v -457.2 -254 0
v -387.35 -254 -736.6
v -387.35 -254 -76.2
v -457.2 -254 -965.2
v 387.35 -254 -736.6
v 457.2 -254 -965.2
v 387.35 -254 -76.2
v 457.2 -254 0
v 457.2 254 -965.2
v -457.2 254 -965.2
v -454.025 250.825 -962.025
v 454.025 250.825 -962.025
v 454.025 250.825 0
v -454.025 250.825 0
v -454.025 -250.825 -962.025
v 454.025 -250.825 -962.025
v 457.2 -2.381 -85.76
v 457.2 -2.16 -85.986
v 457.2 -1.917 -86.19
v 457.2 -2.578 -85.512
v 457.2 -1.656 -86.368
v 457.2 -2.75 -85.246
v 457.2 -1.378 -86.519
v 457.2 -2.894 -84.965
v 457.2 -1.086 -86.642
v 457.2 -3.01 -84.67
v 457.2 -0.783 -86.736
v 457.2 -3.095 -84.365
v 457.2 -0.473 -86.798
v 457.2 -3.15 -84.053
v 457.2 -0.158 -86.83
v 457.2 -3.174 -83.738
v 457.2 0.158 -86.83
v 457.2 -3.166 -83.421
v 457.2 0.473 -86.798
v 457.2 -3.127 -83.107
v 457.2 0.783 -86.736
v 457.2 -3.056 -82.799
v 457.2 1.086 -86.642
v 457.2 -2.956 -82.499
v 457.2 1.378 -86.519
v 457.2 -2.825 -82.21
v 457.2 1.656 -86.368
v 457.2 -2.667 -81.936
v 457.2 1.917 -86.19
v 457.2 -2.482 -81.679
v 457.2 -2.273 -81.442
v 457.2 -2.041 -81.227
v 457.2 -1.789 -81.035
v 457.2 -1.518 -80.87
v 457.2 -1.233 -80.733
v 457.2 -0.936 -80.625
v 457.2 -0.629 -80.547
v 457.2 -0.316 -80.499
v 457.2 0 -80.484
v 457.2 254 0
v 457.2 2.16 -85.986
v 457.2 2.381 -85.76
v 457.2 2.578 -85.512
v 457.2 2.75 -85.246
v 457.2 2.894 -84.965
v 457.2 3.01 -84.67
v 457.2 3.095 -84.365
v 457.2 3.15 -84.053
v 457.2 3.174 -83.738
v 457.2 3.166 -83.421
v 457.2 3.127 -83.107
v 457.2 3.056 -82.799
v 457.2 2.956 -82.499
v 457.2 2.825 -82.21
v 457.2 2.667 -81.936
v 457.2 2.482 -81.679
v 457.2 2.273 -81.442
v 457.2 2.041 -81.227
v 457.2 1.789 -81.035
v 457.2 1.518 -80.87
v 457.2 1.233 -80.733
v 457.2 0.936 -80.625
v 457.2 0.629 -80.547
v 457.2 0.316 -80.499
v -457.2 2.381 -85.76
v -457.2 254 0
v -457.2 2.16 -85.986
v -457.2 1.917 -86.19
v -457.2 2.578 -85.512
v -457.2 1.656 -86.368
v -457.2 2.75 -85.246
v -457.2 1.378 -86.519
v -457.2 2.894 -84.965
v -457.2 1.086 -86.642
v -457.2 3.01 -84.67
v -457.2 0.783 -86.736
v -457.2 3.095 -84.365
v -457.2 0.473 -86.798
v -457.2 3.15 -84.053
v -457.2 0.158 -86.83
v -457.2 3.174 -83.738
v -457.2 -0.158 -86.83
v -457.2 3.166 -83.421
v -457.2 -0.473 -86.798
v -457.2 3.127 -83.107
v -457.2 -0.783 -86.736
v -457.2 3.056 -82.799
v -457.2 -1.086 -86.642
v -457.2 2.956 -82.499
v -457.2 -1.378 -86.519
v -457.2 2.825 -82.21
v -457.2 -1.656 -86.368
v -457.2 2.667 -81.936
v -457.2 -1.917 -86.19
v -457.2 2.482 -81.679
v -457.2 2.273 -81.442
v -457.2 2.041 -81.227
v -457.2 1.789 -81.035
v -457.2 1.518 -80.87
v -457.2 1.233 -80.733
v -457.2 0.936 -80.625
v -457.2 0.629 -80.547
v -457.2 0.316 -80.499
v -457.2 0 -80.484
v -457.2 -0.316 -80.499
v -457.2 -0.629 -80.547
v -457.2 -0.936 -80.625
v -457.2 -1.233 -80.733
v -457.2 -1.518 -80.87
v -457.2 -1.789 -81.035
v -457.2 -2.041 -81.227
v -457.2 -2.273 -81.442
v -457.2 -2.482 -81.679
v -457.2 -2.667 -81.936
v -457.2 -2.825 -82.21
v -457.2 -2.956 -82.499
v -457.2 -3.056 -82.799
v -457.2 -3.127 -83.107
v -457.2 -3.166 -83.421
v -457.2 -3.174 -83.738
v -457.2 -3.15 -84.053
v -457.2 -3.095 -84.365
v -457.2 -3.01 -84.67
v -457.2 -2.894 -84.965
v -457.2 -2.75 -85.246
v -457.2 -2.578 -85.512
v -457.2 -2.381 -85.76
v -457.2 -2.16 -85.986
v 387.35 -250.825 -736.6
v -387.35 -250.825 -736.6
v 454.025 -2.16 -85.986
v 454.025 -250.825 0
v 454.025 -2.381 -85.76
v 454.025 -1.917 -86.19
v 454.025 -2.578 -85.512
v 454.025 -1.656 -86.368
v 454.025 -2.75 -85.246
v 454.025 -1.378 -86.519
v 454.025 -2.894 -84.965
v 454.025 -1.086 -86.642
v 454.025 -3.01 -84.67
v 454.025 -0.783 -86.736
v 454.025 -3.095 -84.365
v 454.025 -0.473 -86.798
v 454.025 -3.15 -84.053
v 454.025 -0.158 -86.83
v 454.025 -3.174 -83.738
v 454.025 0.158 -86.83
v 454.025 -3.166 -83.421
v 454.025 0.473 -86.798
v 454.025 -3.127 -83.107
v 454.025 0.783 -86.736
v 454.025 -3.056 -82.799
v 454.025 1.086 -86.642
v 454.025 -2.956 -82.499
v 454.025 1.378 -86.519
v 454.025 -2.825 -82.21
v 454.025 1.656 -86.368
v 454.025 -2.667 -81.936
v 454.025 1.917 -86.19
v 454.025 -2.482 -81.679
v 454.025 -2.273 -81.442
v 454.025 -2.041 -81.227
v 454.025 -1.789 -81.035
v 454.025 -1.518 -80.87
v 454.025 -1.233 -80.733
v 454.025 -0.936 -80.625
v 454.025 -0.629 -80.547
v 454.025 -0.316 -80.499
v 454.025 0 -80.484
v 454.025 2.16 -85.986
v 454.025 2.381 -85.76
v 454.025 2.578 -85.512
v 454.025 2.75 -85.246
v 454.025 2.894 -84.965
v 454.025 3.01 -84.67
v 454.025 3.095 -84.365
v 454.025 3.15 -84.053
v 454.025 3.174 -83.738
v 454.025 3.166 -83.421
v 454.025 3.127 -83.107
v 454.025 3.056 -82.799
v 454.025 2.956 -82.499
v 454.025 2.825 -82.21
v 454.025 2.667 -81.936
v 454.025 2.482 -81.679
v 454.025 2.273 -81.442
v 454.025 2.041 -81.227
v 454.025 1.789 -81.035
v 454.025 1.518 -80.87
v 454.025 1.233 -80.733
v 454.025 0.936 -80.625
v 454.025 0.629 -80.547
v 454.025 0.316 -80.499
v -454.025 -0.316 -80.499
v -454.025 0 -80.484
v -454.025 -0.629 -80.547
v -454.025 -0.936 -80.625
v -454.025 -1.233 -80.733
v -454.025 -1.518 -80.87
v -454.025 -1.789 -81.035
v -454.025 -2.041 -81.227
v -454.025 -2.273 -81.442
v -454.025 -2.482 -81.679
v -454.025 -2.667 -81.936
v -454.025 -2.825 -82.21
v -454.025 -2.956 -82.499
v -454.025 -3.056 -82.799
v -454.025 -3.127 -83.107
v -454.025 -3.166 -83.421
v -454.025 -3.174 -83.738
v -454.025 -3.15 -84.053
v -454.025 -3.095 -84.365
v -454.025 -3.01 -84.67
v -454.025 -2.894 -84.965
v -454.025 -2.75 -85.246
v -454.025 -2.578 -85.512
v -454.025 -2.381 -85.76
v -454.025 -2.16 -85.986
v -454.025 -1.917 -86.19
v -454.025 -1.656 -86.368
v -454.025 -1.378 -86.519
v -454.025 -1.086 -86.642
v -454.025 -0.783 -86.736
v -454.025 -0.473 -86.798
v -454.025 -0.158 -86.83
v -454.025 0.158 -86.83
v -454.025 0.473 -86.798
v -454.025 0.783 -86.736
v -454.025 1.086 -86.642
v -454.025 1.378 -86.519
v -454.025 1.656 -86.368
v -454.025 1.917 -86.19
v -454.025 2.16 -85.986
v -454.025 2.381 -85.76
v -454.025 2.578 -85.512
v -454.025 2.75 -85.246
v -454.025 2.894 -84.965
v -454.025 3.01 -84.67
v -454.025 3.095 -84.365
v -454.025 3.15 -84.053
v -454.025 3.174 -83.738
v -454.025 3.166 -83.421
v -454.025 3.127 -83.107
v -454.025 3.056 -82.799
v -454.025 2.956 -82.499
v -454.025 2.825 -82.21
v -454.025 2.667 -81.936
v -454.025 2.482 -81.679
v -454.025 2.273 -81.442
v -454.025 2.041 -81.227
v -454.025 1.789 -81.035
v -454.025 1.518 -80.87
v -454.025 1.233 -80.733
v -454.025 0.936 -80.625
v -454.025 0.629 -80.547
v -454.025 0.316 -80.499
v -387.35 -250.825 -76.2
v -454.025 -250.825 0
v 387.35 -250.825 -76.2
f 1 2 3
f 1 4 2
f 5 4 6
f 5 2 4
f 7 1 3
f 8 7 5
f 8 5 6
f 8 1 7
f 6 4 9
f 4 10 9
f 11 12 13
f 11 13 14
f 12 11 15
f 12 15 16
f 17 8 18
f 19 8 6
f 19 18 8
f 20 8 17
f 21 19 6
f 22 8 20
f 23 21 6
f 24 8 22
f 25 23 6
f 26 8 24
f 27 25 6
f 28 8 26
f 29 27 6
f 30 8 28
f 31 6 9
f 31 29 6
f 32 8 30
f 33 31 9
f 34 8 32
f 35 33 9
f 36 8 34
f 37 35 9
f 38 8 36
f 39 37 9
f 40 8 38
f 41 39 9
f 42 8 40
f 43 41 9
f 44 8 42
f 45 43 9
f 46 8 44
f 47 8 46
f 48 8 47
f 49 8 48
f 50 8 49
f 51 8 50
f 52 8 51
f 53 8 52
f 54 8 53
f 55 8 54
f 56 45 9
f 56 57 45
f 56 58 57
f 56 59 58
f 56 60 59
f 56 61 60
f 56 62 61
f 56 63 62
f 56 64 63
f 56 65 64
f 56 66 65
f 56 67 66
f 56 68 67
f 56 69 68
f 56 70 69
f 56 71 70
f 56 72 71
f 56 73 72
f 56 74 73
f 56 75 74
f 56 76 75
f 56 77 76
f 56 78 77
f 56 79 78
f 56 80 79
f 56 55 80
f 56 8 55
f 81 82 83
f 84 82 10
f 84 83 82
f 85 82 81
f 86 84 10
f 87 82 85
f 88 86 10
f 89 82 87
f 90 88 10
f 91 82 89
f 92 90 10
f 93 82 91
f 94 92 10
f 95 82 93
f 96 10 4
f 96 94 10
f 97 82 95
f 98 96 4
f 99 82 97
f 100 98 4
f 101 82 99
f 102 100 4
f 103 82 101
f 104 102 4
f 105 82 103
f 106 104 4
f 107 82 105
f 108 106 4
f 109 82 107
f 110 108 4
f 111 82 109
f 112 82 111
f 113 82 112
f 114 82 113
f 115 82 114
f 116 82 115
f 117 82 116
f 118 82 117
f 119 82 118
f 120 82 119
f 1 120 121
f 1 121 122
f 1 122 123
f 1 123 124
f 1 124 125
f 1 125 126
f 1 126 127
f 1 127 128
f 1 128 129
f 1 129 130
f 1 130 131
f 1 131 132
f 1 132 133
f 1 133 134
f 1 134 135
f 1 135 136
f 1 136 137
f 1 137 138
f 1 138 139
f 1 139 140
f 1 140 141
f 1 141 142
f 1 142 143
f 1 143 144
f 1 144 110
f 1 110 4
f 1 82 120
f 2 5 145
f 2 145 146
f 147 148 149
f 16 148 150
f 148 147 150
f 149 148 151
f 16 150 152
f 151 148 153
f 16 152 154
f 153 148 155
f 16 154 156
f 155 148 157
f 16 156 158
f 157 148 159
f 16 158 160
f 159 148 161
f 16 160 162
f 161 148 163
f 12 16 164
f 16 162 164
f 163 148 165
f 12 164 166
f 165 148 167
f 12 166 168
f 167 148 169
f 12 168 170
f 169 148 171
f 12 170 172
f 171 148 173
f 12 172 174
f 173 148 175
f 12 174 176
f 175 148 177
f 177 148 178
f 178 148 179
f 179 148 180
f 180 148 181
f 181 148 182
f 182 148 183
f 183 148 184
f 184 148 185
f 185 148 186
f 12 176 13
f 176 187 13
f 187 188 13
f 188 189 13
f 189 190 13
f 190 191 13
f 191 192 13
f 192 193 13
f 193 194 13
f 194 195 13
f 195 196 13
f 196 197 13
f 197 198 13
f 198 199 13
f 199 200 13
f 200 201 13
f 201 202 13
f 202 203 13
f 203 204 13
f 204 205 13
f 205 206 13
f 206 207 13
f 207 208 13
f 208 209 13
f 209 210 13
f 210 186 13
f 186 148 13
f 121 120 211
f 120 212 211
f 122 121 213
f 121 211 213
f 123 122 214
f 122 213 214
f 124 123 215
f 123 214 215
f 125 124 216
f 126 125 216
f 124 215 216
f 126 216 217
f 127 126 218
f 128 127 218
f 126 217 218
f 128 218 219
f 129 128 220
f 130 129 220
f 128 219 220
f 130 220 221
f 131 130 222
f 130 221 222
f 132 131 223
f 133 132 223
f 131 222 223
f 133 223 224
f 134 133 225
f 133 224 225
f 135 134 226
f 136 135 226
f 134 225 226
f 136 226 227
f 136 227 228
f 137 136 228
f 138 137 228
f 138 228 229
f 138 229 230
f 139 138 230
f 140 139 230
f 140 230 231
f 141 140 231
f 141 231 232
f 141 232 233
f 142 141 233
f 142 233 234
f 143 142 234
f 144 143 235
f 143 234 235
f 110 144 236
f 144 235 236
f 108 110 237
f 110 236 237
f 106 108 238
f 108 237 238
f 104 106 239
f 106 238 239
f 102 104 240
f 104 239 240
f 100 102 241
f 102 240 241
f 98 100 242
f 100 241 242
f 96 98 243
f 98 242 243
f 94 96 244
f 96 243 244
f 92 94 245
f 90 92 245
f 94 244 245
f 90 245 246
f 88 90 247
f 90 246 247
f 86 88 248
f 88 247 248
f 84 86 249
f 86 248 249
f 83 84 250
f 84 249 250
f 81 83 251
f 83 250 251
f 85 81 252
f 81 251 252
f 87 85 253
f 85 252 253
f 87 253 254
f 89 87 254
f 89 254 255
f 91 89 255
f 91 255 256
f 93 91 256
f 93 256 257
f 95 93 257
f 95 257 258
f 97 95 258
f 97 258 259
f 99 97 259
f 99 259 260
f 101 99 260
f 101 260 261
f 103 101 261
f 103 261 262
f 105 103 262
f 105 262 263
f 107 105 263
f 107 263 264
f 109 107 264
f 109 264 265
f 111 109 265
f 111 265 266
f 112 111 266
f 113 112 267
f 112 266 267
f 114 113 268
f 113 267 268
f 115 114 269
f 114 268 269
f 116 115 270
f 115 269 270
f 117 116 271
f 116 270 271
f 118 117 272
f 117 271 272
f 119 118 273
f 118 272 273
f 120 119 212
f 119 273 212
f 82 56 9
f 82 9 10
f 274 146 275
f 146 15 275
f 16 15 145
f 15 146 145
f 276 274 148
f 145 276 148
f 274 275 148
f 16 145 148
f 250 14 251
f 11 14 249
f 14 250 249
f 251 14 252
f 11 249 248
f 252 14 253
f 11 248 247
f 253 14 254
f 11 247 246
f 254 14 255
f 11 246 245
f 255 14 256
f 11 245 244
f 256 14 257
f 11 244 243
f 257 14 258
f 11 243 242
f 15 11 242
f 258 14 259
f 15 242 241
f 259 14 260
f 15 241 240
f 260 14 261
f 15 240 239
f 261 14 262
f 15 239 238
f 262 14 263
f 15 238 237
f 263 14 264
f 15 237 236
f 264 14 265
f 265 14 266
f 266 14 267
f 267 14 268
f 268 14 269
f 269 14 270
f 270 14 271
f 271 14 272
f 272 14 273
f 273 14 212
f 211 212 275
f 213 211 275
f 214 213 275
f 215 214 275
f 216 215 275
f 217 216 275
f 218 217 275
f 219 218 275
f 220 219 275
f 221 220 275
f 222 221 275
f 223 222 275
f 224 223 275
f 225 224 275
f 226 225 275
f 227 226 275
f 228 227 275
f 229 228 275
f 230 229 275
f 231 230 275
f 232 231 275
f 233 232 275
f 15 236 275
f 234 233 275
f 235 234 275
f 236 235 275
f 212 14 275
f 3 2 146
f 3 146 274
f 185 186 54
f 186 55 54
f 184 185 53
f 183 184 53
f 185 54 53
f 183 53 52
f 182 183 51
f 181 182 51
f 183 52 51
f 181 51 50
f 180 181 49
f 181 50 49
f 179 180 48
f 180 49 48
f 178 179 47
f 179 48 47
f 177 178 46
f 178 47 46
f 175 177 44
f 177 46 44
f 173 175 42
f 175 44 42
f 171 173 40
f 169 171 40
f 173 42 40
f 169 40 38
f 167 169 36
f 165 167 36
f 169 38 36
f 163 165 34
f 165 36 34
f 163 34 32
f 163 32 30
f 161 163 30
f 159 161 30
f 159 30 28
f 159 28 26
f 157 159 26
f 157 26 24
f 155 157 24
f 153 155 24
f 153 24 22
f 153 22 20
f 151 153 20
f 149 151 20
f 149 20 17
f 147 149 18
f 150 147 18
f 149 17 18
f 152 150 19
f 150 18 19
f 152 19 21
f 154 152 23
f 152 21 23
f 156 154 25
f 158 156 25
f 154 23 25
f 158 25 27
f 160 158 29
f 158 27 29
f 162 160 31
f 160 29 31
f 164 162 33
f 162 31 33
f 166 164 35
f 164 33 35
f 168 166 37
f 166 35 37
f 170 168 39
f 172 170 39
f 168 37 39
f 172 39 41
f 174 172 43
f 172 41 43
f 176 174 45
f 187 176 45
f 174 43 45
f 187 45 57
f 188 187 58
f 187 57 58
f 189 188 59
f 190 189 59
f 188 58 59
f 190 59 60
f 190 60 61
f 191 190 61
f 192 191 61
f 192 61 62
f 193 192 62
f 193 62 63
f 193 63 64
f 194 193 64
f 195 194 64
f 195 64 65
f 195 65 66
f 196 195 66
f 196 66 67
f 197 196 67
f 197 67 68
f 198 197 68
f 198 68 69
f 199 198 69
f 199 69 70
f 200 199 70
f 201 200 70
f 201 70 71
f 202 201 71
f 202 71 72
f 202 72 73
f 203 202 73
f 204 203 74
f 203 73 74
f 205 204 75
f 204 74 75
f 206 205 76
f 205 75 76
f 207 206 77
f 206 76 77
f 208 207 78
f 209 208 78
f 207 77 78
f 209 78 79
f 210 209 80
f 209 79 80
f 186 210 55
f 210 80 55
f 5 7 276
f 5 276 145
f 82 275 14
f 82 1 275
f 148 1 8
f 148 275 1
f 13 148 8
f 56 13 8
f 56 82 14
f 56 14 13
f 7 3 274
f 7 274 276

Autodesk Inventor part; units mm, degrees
ref_plane "YZ Plane" through (0, 0, 0) normal (1, 0, 0) x (0, 1, 0)
ref_plane "XZ Plane" through (0, 0, 0) normal (0, 1, 0) x (-1, 0, 0)
ref_plane "XY Plane" through (0, 0, 0) normal (0, 0, 1) x (1, 0, 0)
sketch "Sketch1" plane through (0, 0, 0) normal (0, 0, 1) x (1, 0, 0)
  line L0 (-457.2, -254) -> (457.2, -254)
  line L1 (457.2, -254) -> (457.2, 254)
  line L2 (457.2, 254) -> (-457.2, 254)
  line L3 (-457.2, 254) -> (-457.2, -254)
  line L4 (-457.2, -254) -> (457.2, 254) construction
  line L5 (457.2, -254) -> (-457.2, 254) construction
  point P0 (0, 0)
  dimension "d0" = 914.4
  dimension "d1" = 508
extrude "Extrusion1" add sketch "Sketch1" against normal blind 965.2
shell "Shell1" thickness 3.175 removed faces 1 at (-152.4, 84.6667, 0)
sketch "Sketch2" plane through (-457.2, -254, 0) normal (0, -1, 0) x (1, 0, 0)
  line L0 (0, 0) -> (0, -965.2) projected
  line L1 (914.4, -965.2) -> (0, -965.2) projected
  line L2 (69.85, -76.2) -> (844.55, -76.2)
  line L3 (844.55, -76.2) -> (844.55, -736.6)
  line L4 (844.55, -736.6) -> (69.85, -736.6)
  line L5 (69.85, -736.6) -> (69.85, -76.2)
  point P0 (457.2, 0)
  dimension "d5" = 69.85
  dimension "d6" = 774.7
  dimension "d7" = 660.4
  dimension "d8" = 228.6
extrude "Extrusion2" cut sketch "Sketch2" against normal up to next
sketch "Sketch3" plane through (-457.2, -254, 0) normal (-1, 0, 0) x (0, 0, 1)
  point P0 (0, 254)
  point P1 (-83.6587, 254)
hole "Hole1" at (-457.2, 0, -83.6587) direction (1, 0, 0) diameter 6.35 end through all
ref_plane "Work Plane1" through (0, -254, 0) normal (1, 0, 0) x (0, 1, 0)
properties part number "box_middlegoalLOW" material "Polycarbonate, Clear"
